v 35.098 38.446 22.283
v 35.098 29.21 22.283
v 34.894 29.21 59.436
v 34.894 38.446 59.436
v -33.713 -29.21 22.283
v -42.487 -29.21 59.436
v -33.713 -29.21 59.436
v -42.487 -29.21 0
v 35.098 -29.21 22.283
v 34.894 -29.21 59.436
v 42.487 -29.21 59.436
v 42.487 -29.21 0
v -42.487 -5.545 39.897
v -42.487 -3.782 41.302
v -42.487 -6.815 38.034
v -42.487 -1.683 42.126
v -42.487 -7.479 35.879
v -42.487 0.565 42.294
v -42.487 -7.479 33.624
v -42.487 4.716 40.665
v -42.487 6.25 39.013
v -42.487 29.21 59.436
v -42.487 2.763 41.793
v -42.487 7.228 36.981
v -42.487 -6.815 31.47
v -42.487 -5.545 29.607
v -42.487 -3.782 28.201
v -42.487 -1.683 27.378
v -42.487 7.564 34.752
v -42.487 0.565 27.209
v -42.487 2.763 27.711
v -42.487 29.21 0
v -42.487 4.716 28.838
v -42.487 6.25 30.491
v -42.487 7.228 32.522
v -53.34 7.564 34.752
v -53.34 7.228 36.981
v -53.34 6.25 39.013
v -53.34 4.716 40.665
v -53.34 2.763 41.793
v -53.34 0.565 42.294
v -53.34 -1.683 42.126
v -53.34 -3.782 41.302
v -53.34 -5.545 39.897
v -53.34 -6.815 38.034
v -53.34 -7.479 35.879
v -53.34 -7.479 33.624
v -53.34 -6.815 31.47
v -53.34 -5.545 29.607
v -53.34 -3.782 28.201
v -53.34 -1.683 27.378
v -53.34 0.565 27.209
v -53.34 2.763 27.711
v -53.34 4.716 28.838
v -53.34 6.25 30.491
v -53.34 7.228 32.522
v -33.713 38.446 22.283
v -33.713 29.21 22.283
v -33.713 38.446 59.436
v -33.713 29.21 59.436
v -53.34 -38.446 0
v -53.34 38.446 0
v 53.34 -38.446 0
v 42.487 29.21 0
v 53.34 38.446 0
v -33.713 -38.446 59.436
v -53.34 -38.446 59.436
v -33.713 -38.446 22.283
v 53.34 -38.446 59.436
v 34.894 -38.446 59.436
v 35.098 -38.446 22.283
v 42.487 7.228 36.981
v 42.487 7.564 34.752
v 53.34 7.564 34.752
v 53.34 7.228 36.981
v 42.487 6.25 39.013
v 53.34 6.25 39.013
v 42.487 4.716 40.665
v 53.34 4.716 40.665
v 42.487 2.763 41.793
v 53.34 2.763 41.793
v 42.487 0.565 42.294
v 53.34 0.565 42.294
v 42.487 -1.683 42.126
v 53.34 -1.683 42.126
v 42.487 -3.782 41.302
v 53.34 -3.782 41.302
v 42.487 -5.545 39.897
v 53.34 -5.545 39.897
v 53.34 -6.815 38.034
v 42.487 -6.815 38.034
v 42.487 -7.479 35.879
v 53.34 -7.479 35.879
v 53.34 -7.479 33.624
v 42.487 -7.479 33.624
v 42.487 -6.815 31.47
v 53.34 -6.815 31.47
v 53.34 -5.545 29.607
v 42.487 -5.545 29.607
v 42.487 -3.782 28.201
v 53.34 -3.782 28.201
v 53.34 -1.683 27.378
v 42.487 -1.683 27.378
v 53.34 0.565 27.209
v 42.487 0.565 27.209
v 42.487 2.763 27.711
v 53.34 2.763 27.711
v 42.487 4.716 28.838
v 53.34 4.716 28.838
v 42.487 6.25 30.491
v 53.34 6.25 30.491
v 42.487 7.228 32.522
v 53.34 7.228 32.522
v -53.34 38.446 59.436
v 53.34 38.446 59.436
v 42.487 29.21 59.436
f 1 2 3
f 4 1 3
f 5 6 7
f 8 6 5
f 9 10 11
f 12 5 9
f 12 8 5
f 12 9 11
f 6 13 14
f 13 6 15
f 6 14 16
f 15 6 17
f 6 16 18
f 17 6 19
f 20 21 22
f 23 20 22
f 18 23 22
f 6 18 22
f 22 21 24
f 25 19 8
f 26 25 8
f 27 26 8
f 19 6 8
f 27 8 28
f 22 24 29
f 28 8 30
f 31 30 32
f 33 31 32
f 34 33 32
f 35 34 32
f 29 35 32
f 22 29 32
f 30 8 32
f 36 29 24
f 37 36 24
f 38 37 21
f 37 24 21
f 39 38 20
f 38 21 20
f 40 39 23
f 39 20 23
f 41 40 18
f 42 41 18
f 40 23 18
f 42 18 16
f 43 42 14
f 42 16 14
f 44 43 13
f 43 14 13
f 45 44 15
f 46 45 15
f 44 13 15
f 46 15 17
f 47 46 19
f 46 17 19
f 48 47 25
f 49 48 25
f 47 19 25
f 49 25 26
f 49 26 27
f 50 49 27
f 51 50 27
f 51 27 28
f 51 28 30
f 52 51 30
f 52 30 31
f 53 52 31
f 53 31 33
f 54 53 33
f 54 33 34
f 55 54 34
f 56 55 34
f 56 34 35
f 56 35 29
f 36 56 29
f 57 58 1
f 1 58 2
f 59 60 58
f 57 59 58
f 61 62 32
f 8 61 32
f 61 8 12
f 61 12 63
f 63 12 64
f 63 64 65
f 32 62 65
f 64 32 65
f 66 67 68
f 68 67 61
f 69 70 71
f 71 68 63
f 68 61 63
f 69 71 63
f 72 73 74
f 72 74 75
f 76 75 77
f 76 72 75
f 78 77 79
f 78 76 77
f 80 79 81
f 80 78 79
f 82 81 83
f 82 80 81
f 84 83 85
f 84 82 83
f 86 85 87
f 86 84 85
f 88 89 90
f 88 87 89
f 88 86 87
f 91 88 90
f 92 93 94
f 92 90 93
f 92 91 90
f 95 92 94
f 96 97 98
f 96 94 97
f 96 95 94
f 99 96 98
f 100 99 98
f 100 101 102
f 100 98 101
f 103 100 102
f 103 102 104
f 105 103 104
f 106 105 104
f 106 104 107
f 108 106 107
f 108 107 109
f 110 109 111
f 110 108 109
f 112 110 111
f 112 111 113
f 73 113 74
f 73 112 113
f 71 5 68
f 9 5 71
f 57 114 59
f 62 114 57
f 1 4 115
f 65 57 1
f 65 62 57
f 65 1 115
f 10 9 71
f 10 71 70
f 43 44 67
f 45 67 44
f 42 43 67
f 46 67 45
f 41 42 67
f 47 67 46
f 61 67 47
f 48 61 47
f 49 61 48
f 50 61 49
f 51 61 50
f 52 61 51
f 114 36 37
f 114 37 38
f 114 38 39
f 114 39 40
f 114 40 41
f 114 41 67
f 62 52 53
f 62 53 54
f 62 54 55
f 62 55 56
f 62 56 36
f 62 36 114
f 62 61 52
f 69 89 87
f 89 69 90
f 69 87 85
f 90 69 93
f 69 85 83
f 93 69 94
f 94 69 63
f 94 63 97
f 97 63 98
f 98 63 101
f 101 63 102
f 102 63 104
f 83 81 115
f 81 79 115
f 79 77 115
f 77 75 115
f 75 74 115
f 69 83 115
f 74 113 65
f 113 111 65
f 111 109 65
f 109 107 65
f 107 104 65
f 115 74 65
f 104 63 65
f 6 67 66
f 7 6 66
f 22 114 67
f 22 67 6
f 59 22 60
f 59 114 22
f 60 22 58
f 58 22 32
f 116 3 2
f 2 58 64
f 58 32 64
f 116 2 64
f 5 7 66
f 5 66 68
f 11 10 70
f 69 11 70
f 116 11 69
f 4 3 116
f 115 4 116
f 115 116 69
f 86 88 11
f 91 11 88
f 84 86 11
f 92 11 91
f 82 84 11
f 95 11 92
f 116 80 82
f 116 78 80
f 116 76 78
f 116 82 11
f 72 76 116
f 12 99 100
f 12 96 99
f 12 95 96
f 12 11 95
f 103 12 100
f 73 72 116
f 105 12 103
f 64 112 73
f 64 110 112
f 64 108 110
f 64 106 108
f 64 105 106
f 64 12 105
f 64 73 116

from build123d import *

# Parameters (mm, degrees)
F0_W          = 106.6800057888
F0_H          = 76.8927261233
F1_DEPTH      = 59.436
F2_W          = 84.9745497108
F2_H          = 58.4200024605
F3_DEPTH      = 59.437
F5_DEPTH      = 80.772
F5_DEPTH_BACK = 74.422
F6_R          = 7.5638145865
F7_DEPTH      = 66.548
F7_DEPTH_BACK = 73.152


with BuildPart() as f1:
    # F0 (on Top) → F1 (new body)
    with BuildSketch(Plane.XY):
        Rectangle(F0_W, F0_H)
    extrude(amount=F1_DEPTH)

    # F2 (on Top) → F3 (cut, through all)
    with BuildSketch(Plane.XY):
        Rectangle(F2_W, F2_H)
    extrude(amount=F3_DEPTH, mode=Mode.SUBTRACT)

    # F4 (on Front) → F5 (cut, two sides)
    with BuildSketch(Plane.XZ) as f5_sk:
        Polygon((34.867271781, 64.3081814051), (-33.7127298117, 64.0772730112), (-33.7127298117, 22.2827270627), (35.0981801748, 22.2827270627), align=None)
    extrude(amount=F5_DEPTH, mode=Mode.SUBTRACT)
    extrude(f5_sk.sketch, amount=-F5_DEPTH_BACK, mode=Mode.SUBTRACT)

    # F6 (on Right) → F7 (cut, two sides)
    with BuildSketch(Plane.YZ) as f7_sk:
        with Locations((0, 34.751817584)):
            Circle(F6_R)
    extrude(amount=-F7_DEPTH, mode=Mode.SUBTRACT)
    extrude(f7_sk.sketch, amount=F7_DEPTH_BACK, mode=Mode.SUBTRACT)


solid = f1.part
